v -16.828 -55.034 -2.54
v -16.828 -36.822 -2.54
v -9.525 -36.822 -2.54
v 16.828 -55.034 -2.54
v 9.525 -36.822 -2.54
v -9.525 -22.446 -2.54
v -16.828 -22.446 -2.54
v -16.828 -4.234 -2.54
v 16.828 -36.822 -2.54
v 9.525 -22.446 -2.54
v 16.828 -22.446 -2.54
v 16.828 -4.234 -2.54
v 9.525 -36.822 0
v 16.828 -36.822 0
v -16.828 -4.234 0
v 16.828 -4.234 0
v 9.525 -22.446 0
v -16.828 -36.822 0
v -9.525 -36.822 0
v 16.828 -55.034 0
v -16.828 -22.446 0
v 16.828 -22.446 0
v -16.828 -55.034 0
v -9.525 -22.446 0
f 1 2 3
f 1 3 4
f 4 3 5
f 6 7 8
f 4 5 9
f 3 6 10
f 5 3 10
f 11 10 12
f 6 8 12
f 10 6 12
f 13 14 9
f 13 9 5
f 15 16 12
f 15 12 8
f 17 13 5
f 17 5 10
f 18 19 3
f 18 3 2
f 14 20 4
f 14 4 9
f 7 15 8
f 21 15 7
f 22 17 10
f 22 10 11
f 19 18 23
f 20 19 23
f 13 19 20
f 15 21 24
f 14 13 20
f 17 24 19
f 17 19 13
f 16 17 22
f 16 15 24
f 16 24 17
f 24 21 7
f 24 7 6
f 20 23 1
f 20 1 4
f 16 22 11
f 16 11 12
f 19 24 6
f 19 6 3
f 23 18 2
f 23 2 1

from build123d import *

# Parameters (mm, degrees)
F0_W     = 19.05
F0_H     = 7.1882
F1_DEPTH = 2.54


with BuildPart() as f1:
    # F0 (on Top) → F1 (new body)
    with BuildSketch(Plane.XY):
        Polygon((-16.8275, -22.445938), (-9.525, -22.445938), (9.525, -22.445938), (16.8275, -22.445938), (16.8275, -4.234138), (-16.8275, -4.234138), align=None)
        with Locations((0, -26.040038)):
            Rectangle(F0_W, F0_H)
        with Locations((0, -33.228238)):
            Rectangle(F0_W, F0_H)
        Polygon((-9.525, -36.822338), (-16.8275, -36.822338), (-16.8275, -55.034138), (16.8275, -55.034138), (16.8275, -36.822338), (9.525, -36.822338), align=None)
    extrude(amount=-F1_DEPTH)


solid = f1.part
